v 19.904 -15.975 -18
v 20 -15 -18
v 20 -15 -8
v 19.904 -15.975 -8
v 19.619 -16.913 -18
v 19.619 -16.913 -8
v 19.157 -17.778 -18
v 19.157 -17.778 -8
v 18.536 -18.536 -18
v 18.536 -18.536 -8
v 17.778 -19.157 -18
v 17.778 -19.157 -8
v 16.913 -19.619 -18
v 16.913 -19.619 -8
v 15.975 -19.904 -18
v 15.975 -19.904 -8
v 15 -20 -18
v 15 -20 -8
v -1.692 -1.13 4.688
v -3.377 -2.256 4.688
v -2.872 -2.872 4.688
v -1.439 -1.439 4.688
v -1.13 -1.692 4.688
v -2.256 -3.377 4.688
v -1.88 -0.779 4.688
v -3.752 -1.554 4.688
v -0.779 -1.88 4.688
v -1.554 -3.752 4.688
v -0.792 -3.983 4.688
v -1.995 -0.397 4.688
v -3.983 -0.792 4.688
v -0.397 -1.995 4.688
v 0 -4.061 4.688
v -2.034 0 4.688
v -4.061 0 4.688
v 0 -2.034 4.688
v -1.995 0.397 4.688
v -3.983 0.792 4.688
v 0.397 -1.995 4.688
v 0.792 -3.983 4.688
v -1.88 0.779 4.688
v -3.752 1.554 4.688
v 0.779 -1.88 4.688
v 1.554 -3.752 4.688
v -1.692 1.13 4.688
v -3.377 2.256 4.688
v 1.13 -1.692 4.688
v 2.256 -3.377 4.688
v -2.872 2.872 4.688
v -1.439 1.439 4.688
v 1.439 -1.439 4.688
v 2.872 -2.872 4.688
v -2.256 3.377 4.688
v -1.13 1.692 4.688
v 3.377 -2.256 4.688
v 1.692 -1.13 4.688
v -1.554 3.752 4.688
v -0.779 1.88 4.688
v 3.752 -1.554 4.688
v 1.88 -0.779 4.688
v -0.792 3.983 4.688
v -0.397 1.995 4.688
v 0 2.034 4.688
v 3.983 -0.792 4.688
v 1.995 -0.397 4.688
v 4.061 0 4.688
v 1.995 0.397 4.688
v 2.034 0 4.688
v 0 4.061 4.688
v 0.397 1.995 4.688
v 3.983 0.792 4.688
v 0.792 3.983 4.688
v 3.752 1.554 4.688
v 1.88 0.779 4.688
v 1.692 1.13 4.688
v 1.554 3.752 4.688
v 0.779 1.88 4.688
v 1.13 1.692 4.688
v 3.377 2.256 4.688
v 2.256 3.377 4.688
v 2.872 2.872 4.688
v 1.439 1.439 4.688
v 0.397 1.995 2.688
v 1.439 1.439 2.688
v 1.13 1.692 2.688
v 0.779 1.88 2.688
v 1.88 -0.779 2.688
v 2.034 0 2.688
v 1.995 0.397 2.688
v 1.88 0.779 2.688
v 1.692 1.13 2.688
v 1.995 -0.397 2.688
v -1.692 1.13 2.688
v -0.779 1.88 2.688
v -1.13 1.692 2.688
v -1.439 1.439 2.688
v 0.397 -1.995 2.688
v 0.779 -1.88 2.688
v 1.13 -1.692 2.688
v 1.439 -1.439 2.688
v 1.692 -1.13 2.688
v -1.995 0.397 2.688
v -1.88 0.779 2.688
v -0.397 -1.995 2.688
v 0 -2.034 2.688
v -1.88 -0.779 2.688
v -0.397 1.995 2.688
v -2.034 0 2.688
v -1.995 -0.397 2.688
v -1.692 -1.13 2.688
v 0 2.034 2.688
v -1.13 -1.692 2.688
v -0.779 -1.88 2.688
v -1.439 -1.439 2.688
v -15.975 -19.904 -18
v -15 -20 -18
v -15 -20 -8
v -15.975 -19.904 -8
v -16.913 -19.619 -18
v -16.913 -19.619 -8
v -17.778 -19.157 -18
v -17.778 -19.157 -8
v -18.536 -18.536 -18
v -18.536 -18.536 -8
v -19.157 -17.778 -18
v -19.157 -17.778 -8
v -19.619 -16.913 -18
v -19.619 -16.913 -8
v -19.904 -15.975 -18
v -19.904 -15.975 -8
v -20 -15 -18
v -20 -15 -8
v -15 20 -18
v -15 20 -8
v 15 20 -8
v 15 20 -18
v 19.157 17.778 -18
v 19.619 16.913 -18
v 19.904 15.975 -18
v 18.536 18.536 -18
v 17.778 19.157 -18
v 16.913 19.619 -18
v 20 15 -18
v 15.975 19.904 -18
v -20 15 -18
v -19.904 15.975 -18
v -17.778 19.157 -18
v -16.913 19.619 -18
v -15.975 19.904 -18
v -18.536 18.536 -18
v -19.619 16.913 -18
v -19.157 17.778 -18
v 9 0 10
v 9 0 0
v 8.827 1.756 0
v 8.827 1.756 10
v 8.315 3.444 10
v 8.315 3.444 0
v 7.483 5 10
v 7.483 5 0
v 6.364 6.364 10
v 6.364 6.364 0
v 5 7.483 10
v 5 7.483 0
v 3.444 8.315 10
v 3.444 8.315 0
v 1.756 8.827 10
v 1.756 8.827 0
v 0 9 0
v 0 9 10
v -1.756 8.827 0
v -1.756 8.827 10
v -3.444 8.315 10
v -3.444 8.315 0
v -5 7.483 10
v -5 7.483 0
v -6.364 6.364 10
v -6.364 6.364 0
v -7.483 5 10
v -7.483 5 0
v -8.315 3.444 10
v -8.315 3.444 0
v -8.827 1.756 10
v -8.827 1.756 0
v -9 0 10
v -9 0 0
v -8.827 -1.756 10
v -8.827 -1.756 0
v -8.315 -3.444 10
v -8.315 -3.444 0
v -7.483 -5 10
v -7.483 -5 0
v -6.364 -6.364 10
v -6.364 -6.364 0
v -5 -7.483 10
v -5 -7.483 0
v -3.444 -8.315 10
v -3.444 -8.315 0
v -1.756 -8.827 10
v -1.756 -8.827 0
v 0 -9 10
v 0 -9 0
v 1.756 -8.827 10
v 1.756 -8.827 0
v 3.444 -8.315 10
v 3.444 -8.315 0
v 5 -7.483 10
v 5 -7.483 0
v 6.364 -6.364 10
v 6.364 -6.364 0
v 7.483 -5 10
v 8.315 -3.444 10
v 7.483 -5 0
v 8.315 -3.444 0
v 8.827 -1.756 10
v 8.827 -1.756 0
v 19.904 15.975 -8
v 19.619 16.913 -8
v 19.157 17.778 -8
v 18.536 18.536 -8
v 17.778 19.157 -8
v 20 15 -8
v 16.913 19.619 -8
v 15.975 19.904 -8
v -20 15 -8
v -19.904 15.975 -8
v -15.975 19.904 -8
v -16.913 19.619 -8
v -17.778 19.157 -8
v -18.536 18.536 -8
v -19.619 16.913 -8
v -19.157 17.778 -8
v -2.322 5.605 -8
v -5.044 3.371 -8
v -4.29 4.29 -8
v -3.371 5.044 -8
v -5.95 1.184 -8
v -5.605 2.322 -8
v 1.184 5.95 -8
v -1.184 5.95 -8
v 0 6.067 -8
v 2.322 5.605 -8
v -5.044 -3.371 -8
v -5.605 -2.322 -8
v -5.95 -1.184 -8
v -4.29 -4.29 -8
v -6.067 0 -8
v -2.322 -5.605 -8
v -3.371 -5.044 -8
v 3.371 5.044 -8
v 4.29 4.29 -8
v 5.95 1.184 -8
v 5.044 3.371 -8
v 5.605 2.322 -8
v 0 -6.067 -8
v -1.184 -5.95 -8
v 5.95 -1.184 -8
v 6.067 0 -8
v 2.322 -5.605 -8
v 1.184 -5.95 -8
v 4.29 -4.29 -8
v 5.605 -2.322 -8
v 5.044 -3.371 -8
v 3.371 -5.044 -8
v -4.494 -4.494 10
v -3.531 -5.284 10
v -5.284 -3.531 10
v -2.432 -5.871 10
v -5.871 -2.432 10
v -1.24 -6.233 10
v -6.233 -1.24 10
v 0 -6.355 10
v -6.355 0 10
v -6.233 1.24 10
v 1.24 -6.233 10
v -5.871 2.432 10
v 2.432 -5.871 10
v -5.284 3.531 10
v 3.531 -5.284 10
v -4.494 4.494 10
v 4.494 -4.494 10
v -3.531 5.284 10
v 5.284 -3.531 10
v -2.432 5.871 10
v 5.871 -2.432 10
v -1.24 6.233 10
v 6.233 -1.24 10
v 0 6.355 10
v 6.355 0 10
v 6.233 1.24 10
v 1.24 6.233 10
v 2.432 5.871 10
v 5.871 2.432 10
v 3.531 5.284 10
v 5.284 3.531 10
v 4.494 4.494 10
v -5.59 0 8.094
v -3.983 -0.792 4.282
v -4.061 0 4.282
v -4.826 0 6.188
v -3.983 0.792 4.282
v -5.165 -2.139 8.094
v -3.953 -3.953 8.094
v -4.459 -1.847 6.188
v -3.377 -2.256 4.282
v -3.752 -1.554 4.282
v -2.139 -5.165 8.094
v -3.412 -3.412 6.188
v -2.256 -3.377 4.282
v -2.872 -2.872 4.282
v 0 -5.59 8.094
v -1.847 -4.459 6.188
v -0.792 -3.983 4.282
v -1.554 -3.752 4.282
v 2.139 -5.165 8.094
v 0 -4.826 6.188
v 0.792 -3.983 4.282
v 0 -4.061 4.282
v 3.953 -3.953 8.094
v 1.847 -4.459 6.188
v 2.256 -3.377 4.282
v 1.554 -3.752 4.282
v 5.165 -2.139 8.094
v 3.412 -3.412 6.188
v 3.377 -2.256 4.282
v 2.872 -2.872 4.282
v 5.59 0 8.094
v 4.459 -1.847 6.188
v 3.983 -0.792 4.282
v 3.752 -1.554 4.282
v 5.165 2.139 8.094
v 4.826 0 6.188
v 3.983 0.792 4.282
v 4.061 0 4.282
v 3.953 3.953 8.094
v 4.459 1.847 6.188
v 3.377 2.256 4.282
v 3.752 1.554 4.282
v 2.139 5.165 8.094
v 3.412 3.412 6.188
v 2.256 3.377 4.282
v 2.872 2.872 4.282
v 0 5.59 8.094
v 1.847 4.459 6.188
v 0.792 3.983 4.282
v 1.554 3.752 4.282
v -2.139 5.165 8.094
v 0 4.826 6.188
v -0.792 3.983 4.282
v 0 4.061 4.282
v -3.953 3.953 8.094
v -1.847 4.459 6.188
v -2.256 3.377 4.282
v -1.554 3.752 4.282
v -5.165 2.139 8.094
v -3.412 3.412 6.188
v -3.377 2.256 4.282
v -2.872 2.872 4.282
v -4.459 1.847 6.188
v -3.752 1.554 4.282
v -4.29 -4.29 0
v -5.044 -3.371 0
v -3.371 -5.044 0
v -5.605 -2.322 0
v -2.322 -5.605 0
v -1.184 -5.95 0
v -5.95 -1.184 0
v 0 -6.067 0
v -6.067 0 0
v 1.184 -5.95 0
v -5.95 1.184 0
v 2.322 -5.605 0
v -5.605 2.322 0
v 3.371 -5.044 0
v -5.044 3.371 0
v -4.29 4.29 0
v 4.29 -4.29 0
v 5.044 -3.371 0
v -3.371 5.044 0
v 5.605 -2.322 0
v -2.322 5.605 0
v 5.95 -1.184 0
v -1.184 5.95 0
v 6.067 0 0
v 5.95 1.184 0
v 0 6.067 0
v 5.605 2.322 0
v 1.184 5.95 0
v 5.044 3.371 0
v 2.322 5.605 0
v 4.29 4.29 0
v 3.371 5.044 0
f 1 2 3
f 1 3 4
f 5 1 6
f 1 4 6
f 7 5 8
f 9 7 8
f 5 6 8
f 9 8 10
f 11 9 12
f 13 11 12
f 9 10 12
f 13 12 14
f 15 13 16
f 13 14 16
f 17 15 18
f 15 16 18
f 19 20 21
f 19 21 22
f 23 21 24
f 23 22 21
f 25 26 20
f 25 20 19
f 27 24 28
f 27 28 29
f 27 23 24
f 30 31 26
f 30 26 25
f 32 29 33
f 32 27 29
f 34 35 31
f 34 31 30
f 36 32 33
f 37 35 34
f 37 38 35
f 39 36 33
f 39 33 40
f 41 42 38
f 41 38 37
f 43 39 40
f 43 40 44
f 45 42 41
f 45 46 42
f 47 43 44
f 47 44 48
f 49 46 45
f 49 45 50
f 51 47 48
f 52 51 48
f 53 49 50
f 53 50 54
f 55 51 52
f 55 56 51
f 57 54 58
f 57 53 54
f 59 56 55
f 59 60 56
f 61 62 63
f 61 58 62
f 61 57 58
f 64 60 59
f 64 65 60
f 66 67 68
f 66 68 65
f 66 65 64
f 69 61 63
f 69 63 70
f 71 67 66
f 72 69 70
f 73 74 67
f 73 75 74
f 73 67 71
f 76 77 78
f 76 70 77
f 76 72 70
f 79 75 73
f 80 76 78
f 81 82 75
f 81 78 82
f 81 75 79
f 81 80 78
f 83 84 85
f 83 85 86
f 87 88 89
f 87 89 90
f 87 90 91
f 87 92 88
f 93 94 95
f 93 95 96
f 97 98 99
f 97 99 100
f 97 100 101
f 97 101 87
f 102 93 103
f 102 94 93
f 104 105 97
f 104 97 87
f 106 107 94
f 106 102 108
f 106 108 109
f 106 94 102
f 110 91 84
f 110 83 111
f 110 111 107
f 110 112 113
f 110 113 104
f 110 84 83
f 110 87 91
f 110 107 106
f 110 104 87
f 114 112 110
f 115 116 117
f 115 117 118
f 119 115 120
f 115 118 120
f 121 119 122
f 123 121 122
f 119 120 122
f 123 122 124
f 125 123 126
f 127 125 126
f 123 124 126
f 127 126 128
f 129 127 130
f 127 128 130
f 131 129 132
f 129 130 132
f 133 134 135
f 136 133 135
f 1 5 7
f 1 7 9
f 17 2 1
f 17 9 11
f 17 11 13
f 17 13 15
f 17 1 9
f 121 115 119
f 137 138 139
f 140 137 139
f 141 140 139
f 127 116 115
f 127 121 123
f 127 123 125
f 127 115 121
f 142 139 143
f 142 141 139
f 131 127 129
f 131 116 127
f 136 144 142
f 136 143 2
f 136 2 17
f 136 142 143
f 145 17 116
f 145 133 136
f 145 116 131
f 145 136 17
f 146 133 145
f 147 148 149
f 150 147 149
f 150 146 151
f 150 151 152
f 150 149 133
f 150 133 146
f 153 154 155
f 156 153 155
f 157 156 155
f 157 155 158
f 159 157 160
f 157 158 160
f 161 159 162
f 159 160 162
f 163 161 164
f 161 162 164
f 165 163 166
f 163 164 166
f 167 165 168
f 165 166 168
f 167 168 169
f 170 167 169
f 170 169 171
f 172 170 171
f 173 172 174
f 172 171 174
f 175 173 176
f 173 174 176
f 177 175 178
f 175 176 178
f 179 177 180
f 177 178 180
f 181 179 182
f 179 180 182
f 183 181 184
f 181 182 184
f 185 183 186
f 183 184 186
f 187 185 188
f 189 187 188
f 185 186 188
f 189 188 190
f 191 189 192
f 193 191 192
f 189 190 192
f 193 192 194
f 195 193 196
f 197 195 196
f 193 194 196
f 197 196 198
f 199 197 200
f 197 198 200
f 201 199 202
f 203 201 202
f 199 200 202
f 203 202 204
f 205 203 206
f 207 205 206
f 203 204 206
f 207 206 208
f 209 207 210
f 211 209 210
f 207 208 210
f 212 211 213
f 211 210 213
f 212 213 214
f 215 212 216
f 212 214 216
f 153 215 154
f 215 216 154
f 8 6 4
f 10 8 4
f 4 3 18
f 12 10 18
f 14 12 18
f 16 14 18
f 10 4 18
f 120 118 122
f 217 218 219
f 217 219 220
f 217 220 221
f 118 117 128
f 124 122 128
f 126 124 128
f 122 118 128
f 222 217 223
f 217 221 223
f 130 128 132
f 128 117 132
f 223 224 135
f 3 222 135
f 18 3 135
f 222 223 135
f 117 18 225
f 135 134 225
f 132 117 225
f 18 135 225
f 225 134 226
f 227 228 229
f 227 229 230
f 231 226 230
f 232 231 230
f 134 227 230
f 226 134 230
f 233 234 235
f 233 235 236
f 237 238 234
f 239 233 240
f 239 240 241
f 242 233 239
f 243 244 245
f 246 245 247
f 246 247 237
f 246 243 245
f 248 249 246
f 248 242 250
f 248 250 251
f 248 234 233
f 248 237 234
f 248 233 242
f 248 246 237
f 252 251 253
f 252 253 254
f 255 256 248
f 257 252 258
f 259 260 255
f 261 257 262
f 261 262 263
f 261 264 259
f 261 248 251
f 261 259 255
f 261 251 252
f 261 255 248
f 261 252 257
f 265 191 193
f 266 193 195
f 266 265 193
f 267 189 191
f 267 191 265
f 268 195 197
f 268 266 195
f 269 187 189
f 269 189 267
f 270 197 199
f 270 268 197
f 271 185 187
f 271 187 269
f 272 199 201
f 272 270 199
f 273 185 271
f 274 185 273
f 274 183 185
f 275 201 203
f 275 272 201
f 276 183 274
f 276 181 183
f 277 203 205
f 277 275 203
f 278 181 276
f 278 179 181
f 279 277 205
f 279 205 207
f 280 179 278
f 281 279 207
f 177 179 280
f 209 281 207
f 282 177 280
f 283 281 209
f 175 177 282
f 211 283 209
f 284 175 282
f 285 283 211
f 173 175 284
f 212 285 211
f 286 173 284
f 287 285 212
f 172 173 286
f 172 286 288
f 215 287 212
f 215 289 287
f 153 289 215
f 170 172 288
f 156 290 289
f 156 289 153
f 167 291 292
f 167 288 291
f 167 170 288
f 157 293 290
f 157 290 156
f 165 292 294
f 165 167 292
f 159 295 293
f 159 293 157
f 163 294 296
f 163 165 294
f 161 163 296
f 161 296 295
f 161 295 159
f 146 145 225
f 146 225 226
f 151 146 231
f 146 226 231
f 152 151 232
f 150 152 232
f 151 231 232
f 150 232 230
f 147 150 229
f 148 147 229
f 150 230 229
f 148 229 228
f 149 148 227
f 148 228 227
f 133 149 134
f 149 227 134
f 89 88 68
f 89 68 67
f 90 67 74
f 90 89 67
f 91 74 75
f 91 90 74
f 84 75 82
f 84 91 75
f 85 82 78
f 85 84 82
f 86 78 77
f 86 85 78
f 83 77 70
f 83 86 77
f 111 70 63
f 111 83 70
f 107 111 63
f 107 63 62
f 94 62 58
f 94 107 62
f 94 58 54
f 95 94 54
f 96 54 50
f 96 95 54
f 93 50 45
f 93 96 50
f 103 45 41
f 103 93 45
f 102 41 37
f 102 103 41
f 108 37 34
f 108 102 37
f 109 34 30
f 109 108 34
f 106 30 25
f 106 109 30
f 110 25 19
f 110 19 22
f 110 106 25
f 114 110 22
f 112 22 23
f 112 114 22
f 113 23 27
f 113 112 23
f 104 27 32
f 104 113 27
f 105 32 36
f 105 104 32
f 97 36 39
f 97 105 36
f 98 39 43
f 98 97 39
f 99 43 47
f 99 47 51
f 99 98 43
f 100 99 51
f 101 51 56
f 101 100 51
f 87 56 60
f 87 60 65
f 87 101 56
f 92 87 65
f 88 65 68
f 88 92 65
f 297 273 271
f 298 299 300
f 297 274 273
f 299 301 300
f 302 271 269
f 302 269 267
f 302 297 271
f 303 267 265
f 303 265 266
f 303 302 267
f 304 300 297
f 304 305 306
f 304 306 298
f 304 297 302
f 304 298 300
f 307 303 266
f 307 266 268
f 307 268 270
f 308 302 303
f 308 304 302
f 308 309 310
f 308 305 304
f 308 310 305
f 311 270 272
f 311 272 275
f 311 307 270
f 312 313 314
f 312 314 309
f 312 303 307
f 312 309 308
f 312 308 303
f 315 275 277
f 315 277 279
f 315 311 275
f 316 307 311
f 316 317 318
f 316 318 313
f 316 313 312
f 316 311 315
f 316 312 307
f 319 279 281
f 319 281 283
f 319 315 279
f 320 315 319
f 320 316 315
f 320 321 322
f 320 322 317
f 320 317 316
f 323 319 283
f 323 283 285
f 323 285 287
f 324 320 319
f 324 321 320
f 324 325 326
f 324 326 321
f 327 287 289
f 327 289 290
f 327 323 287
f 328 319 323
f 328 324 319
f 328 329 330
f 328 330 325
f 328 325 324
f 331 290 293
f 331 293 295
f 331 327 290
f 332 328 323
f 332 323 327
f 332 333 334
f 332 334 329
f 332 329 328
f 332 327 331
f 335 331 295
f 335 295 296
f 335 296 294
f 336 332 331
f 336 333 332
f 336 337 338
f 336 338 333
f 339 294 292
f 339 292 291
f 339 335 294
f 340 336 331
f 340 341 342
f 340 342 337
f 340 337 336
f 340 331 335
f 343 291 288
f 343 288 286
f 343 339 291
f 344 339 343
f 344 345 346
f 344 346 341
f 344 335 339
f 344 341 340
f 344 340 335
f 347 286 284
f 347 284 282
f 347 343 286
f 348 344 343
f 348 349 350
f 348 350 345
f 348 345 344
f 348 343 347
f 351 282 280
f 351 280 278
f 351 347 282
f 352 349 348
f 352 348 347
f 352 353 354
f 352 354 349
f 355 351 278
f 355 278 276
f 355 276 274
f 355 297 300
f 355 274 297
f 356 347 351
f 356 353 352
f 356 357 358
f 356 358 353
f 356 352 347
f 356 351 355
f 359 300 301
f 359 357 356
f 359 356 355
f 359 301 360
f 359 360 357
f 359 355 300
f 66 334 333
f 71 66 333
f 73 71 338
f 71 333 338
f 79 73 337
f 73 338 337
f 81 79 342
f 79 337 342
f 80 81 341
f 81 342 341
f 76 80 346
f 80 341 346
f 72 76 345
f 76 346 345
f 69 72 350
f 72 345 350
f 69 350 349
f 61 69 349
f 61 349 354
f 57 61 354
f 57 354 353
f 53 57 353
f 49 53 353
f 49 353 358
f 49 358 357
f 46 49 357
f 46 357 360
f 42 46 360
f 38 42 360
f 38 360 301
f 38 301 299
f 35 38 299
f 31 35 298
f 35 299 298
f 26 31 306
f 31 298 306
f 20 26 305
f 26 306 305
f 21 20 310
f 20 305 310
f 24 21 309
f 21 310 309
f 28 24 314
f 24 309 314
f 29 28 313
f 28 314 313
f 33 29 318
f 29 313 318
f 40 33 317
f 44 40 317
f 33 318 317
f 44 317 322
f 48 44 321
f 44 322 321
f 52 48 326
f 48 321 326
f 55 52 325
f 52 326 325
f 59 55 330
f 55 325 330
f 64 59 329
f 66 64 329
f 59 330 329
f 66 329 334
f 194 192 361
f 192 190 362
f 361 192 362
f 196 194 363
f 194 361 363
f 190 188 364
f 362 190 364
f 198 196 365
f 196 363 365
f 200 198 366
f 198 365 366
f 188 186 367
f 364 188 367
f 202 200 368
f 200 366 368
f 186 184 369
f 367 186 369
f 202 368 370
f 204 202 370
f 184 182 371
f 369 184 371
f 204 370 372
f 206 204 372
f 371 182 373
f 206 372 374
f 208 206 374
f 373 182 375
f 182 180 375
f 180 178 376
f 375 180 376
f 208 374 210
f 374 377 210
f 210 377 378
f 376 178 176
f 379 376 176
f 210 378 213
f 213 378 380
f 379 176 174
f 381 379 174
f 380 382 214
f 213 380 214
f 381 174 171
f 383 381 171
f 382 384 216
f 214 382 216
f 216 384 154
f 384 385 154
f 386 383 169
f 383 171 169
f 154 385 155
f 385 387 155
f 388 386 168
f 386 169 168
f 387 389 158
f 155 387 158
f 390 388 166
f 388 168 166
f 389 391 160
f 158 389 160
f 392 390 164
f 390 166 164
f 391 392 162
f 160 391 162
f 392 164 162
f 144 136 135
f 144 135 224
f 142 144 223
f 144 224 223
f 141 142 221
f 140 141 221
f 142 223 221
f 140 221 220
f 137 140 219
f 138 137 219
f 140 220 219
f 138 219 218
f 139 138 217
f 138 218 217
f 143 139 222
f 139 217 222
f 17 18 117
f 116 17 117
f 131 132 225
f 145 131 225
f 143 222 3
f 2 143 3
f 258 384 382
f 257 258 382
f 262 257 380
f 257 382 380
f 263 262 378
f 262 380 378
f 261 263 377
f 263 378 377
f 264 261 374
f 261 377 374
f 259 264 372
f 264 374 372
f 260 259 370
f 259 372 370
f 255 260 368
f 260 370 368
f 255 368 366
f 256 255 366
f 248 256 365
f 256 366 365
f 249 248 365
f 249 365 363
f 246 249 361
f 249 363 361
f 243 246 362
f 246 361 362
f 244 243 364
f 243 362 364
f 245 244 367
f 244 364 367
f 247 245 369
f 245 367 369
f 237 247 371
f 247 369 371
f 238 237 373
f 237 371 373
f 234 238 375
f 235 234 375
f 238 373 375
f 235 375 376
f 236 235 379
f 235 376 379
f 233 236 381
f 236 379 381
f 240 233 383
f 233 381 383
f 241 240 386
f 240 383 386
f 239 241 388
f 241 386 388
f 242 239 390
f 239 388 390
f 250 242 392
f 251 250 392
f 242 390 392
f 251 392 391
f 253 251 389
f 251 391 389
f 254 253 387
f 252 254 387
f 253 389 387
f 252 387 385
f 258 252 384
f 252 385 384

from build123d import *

# Parameters (mm, degrees)
SKETCH_1_R      = 9
EXTRUDE_1_DEPTH = 10
SKETCH_3_R      = 4.061339688
SKETCH_3_R_2    = 2.034438867
EXTRUDE_2_DEPTH = 2
SKETCH_4_R      = 6.066882161
EXTRUDE_3_DEPTH = 8
EXTRUDE_4_DEPTH = 10


with BuildPart() as part:
    # Эскиз1 → Бобышка-Вытянуть1 (new body)
    with BuildSketch(Plane.XY):
        Circle(SKETCH_1_R)
    extrude(amount=EXTRUDE_1_DEPTH)

    # Эскиз2 → Вырез-Повернуть1 (revolve, cut)
    with BuildSketch(Plane(origin=(0, 0, 0), x_dir=(1, 0, 0), z_dir=(0, 1, 0)), mode=Mode.PRIVATE) as cut_revolve_1_sk:
        Polygon((0, -10), (6.354968878, -10), (3.421999094, -2.687643664), (0, -2.687643664), align=None)
    revolve(cut_revolve_1_sk.sketch.rotate(Axis((0, 0, 2.687643664), (0, 0, 1)), 180), axis=Axis((0, 0, 2.687643664), (0, 0, 1)), mode=Mode.SUBTRACT)

    # Эскиз3 → Бобышка-Вытянуть2 (add)
    with BuildSketch(Plane.XY.offset(2.687643664)):
        Circle(SKETCH_3_R)
        Circle(SKETCH_3_R_2, mode=Mode.SUBTRACT)
    extrude(amount=EXTRUDE_2_DEPTH)

    # Эскиз4 → Бобышка-Вытянуть3 (add)
    with BuildSketch(Plane(origin=(0, 0, 0), x_dir=(-1, 0, 0), z_dir=(0, 0, -1))):
        with Locations(Location((0, 0, 0), (0, 0, 180))):
            Circle(SKETCH_4_R)
    extrude(amount=EXTRUDE_3_DEPTH)


with BuildPart() as body_2:
    # Эскиз5 → Бобышка-Вытянуть4 (new body)
    with BuildSketch(Plane(origin=(0, 0, -8), x_dir=(-1, 0, 0), z_dir=(0, 0, -1))):
        with BuildLine():
            Line((-15, -20), (15, -20))
            ThreePointArc((15, -20), (18.535533906, -18.535533906), (20, -15))
            Line((20, -15), (20, 15))
            ThreePointArc((20, 15), (18.535533906, 18.535533906), (15, 20))
            Line((15, 20), (-15, 20))
            ThreePointArc((-15, 20), (-18.535533906, 18.535533906), (-20, 15))
            Line((-20, 15), (-20, -15))
            ThreePointArc((-20, -15), (-18.535533906, -18.535533906), (-15, -20))
        make_face()
    extrude(amount=EXTRUDE_4_DEPTH)


solid = Compound([part.part, body_2.part])
